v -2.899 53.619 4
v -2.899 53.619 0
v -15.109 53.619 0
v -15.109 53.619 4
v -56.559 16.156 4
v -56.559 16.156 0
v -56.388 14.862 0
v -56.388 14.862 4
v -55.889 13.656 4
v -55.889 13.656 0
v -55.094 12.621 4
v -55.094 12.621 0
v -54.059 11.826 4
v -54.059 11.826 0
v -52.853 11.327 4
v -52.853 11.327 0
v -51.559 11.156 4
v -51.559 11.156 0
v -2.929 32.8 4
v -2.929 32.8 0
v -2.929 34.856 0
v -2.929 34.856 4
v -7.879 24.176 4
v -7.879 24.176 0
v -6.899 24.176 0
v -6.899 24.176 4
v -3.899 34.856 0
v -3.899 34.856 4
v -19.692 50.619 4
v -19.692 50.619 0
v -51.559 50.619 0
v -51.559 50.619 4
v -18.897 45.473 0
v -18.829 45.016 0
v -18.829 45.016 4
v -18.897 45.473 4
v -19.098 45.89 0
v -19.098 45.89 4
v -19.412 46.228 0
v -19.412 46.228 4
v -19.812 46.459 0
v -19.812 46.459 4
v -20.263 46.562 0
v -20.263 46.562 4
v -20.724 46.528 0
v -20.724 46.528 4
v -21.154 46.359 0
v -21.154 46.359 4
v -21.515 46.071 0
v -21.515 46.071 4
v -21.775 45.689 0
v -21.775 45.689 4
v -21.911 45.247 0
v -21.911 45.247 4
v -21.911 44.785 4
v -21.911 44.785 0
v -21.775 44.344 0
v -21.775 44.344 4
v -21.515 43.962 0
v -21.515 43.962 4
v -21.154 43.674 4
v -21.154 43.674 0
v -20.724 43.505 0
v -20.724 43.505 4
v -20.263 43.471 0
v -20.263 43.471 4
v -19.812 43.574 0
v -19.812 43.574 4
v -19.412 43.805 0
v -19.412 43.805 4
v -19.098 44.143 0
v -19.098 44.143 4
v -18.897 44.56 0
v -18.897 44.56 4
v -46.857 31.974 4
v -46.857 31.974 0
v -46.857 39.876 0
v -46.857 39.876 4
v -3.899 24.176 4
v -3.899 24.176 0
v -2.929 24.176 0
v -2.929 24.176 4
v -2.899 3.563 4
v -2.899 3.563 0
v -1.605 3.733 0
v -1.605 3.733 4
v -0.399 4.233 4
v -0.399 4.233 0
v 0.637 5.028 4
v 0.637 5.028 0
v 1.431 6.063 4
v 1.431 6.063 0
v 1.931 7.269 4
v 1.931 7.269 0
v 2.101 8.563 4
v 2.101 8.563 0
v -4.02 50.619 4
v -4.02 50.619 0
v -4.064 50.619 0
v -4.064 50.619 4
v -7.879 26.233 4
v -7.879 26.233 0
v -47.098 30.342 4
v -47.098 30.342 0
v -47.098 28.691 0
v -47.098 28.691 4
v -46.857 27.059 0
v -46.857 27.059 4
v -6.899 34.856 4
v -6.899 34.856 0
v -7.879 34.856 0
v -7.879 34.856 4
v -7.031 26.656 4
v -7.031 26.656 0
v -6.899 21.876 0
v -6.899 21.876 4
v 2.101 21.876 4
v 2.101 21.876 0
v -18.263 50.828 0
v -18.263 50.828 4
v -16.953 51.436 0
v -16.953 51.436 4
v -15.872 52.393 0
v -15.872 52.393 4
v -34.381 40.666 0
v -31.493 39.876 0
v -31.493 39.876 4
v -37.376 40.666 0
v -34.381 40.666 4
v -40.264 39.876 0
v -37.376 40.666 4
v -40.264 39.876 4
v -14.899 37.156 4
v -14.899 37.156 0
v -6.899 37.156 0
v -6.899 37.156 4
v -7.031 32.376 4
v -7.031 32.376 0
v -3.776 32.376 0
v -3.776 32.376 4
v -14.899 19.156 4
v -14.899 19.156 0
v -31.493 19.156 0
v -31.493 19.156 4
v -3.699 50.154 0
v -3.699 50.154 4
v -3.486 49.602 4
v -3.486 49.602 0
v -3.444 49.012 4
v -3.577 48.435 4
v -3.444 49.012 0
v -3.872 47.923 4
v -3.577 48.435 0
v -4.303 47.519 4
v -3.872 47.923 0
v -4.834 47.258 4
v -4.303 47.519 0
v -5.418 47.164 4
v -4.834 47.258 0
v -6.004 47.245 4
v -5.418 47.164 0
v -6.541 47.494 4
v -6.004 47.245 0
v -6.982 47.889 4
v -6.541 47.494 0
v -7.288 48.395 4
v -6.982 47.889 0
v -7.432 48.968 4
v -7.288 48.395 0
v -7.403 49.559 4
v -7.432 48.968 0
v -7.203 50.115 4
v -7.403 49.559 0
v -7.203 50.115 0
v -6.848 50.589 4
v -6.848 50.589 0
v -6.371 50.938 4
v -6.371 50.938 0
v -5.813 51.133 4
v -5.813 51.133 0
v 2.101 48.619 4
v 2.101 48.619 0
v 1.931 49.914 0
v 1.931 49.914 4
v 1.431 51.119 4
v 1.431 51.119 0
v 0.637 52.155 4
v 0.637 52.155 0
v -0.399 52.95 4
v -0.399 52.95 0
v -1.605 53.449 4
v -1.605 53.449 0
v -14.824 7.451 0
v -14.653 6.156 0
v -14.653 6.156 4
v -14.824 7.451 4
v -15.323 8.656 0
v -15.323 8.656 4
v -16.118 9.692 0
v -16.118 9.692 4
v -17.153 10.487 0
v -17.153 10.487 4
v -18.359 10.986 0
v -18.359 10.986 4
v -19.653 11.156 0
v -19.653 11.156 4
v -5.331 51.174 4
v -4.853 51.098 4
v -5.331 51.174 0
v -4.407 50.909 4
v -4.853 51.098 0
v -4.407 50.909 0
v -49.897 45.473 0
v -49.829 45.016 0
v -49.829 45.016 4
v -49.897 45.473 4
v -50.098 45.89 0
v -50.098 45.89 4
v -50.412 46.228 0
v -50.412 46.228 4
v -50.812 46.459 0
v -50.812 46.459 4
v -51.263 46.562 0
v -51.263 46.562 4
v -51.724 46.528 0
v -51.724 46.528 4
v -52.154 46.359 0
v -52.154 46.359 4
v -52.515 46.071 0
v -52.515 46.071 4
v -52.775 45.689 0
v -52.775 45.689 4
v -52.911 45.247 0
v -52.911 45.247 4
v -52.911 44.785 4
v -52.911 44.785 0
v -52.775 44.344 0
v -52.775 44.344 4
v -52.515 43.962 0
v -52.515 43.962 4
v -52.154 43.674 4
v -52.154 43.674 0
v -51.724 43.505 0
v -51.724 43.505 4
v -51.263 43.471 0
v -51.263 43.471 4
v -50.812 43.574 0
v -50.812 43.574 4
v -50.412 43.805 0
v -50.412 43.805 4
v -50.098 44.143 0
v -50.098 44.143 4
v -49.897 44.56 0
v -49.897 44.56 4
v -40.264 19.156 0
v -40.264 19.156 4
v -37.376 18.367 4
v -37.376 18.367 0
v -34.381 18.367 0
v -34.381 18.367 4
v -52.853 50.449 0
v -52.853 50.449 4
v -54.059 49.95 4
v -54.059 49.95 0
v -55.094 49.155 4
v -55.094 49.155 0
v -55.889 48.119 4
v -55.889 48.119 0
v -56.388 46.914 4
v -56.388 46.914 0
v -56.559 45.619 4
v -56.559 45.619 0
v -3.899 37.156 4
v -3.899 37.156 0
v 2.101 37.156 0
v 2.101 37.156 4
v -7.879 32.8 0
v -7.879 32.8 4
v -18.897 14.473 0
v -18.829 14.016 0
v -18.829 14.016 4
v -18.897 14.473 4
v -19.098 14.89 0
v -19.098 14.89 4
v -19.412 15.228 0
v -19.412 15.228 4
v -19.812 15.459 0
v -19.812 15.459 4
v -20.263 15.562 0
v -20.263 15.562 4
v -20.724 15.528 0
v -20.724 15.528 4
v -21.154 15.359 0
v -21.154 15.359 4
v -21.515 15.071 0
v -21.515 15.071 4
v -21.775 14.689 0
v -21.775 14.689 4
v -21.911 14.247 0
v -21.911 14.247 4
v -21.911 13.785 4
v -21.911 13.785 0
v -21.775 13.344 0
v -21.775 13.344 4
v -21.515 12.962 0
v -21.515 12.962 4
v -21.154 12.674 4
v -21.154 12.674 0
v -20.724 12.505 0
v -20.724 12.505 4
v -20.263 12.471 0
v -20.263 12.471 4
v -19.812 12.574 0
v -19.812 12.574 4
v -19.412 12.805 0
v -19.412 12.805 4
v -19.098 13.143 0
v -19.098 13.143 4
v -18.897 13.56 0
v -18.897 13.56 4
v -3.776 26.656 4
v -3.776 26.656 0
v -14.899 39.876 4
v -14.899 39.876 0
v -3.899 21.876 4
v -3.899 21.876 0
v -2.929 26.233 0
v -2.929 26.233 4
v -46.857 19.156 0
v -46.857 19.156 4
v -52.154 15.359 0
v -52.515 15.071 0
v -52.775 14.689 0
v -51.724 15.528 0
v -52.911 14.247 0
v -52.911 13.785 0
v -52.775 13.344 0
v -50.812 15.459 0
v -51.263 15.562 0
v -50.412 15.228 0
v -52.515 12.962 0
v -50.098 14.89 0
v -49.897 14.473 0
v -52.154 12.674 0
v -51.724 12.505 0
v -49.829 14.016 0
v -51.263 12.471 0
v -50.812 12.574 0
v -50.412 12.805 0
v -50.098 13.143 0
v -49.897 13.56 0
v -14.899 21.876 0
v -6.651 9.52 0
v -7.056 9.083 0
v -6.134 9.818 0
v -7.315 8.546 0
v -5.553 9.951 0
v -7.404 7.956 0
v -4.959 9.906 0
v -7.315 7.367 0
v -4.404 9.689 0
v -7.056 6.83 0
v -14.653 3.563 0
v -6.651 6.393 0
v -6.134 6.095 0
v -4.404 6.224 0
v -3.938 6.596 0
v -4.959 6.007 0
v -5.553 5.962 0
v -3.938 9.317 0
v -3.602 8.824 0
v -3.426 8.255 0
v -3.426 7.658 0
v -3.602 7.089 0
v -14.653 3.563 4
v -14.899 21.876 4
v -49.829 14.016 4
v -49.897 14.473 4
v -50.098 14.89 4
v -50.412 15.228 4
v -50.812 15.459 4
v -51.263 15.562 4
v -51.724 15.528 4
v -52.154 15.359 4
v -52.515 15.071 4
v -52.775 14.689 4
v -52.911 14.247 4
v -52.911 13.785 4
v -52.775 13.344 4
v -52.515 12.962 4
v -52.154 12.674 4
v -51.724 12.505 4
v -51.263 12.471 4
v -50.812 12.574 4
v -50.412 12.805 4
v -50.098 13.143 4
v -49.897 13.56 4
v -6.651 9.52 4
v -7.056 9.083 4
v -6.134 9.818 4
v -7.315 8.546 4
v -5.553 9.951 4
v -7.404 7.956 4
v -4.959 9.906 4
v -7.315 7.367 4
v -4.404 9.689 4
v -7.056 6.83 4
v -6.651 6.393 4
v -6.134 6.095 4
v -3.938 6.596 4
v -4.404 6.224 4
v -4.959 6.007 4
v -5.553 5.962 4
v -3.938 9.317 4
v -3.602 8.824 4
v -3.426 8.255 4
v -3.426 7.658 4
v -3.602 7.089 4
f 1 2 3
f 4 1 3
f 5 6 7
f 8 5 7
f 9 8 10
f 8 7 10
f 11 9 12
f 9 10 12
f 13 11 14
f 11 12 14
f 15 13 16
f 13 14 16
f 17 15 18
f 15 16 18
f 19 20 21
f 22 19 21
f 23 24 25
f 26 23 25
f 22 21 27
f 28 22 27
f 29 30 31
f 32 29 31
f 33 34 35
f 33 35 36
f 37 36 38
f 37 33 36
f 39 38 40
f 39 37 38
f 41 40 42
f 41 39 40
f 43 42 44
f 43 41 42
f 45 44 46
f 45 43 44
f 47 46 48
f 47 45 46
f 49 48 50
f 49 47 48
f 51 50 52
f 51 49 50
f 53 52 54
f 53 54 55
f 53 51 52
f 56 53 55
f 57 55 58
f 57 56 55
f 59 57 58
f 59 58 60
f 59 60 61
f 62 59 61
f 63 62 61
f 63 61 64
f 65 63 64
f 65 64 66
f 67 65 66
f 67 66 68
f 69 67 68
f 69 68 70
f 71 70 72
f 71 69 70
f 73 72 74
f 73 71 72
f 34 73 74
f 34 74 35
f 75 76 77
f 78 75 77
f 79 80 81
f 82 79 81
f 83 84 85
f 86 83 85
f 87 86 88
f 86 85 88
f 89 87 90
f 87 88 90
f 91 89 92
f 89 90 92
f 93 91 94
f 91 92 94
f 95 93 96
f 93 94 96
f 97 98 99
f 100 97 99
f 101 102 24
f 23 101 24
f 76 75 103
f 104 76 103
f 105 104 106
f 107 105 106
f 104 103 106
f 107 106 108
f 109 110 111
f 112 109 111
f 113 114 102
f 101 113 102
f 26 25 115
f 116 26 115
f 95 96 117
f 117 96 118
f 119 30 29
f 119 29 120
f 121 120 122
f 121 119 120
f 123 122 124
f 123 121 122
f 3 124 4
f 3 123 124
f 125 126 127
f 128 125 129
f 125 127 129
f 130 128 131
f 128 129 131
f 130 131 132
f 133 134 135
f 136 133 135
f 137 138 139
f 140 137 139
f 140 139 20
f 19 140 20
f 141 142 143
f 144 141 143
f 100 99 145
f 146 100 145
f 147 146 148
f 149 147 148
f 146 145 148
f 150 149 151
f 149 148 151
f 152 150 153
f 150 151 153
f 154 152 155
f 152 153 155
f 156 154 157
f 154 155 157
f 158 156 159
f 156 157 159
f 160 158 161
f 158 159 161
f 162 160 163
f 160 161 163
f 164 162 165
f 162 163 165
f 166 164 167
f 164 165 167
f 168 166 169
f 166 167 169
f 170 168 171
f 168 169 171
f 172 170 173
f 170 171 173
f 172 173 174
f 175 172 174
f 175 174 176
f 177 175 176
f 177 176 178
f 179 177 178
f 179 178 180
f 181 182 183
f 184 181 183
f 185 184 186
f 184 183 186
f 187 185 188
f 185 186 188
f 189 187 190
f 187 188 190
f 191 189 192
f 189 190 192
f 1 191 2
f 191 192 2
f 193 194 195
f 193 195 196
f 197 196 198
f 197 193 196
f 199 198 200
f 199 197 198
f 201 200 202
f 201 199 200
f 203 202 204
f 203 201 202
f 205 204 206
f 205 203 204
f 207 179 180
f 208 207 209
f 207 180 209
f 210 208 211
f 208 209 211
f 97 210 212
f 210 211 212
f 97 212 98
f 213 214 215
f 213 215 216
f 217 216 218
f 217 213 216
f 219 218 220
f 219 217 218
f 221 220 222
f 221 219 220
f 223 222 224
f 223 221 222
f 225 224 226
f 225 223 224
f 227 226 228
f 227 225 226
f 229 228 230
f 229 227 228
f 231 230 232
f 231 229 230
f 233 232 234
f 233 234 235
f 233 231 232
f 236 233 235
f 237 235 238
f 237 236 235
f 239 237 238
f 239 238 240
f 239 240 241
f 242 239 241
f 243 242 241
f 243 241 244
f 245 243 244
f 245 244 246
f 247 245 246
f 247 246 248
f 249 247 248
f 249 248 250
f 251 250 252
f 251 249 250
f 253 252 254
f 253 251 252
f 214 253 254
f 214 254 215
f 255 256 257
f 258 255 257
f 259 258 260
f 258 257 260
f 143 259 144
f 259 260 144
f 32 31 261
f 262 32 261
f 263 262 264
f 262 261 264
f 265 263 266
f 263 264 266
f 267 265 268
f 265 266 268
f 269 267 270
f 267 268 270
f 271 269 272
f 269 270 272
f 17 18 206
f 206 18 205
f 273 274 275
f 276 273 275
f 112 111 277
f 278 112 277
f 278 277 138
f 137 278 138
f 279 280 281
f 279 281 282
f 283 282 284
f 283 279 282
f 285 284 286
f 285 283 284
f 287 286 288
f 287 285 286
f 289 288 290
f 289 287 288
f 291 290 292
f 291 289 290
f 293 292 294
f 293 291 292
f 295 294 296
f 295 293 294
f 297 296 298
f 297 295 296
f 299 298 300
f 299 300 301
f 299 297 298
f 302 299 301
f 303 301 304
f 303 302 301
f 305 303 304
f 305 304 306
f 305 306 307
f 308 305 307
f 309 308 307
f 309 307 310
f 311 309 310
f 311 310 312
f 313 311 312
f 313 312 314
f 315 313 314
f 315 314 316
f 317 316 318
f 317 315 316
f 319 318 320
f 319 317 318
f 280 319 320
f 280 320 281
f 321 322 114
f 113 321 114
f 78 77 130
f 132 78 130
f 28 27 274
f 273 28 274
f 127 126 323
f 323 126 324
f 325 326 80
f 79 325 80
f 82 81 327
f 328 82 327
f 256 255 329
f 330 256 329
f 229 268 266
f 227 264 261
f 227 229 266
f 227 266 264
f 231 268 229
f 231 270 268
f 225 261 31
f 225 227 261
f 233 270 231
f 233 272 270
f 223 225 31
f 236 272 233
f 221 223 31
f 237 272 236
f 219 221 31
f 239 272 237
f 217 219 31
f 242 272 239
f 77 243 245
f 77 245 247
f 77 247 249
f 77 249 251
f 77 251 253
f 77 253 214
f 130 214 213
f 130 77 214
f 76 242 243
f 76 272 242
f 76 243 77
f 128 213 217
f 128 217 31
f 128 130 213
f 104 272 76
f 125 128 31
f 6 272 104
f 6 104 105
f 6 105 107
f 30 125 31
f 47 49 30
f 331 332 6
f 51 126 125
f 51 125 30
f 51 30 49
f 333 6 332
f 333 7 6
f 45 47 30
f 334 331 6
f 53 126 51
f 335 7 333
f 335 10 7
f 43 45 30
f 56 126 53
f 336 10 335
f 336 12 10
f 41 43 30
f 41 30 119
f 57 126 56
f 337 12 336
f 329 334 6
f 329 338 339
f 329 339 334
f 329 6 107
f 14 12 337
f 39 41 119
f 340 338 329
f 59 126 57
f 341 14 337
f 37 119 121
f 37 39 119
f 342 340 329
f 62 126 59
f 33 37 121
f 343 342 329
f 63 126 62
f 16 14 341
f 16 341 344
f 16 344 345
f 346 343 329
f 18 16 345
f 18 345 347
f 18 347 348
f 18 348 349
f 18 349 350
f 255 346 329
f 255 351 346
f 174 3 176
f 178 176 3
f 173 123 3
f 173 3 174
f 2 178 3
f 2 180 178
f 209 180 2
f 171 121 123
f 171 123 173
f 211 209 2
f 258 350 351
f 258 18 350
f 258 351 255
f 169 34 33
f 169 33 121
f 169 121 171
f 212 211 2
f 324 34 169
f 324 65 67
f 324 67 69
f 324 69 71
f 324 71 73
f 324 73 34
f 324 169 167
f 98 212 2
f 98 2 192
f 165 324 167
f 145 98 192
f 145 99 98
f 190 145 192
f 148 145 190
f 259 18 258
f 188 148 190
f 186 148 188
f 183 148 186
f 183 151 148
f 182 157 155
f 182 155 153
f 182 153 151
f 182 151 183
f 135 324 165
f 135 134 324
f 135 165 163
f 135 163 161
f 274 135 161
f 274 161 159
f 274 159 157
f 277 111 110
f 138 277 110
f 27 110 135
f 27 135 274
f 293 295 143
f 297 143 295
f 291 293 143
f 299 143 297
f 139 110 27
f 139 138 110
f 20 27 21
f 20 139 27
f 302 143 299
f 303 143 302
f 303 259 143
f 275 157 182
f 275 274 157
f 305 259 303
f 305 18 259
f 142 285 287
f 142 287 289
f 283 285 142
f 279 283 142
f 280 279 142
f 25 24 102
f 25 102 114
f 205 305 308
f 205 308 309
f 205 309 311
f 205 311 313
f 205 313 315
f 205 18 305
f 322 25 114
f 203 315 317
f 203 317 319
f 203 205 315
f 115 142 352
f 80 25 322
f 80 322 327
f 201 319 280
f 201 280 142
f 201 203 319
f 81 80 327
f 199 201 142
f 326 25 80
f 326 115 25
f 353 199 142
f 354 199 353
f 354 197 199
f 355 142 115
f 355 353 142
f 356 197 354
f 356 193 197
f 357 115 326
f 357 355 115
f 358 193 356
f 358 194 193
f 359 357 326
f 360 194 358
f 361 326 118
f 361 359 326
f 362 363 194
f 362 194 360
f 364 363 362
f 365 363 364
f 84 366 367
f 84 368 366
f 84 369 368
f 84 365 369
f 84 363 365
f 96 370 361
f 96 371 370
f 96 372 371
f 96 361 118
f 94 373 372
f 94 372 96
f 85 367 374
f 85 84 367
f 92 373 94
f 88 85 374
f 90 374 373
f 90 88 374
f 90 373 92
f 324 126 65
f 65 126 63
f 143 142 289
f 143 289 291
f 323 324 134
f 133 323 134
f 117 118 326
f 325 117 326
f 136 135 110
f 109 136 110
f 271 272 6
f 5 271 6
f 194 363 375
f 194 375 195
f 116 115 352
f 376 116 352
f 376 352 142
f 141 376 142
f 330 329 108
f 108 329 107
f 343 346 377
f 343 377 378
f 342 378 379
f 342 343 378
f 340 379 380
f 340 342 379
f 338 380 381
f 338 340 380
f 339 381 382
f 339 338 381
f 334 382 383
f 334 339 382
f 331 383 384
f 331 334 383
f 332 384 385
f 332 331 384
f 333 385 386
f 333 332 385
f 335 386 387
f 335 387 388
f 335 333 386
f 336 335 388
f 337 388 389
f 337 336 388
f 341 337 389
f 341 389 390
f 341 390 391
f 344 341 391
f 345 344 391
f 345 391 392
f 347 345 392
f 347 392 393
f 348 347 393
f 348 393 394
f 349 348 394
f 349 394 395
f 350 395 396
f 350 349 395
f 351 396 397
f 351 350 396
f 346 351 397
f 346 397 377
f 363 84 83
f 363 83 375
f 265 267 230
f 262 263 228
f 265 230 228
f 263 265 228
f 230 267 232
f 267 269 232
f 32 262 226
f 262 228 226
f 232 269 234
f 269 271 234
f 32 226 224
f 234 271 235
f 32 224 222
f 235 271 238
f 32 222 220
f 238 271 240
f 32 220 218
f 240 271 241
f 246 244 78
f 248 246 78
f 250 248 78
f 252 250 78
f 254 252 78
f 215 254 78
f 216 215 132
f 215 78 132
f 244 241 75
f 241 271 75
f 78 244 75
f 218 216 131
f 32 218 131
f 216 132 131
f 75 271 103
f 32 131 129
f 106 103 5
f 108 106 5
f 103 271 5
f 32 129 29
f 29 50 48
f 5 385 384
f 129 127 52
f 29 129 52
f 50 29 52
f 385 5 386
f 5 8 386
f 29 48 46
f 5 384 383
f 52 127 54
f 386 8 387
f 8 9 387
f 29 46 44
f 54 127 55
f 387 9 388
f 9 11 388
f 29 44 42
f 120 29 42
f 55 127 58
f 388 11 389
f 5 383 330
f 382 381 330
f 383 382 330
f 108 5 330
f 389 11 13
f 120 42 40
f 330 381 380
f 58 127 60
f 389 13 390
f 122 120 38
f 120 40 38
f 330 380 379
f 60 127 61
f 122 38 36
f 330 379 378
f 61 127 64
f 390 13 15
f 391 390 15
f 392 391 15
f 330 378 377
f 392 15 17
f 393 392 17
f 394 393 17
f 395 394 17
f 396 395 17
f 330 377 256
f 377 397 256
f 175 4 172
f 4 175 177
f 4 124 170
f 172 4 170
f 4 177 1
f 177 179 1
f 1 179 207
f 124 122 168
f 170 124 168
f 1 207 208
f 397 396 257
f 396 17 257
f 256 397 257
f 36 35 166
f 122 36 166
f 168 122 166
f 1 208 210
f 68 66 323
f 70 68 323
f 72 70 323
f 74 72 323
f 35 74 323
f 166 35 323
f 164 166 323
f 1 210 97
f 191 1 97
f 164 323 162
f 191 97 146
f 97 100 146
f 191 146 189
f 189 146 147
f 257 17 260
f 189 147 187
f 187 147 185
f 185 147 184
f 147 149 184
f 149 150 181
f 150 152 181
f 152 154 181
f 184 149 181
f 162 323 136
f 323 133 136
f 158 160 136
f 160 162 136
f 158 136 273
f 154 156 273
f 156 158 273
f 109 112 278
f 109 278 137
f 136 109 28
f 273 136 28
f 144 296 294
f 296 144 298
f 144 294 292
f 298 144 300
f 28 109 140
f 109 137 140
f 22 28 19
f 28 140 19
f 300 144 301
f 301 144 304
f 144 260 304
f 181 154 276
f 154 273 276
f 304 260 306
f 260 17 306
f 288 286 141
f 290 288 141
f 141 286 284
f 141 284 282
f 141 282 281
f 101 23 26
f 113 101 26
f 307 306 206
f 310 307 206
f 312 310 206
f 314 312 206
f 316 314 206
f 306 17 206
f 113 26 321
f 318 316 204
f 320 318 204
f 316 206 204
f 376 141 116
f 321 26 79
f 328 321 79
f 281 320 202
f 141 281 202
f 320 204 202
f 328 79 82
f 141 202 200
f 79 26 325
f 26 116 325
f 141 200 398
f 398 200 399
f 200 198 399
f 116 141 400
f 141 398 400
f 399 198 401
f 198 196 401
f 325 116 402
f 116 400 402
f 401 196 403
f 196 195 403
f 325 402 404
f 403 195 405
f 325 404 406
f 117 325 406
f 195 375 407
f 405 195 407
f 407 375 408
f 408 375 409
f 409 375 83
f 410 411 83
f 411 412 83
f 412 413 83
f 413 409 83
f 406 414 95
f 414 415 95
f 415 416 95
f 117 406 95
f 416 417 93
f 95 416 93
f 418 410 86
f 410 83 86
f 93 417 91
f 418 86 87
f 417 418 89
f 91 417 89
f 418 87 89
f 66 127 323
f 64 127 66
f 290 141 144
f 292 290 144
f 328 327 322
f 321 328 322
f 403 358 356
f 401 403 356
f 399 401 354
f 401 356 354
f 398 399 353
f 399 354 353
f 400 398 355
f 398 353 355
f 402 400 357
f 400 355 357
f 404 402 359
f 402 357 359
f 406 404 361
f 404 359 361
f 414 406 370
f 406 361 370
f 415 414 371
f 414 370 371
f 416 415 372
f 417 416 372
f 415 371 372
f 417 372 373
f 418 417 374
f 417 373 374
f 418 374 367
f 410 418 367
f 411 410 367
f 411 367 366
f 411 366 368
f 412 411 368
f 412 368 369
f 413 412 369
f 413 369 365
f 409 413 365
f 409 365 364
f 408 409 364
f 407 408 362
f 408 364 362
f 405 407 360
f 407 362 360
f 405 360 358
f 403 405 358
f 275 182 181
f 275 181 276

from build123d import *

# Parameters (mm, degrees)
SKETCH1_R           = 1.55
BOSS_EXTRUDE1_DEPTH = 4
SKETCH2_R           = 11.25
CUT_EXTRUDE1_DEPTH  = 10
SKETCH4_R           = 2
SKETCH4_W           = 16.7545444
SKETCH4_H           = 7.593360653
BOSS_EXTRUDE2_DEPTH = 4
SKETCH5_R           = 2.001806379
CUT_EXTRUDE2_DEPTH  = 79.038052705
FILLET1_R           = 5


with BuildPart() as part:
    # Sketch1 → Boss-Extrude1 (new body)
    with BuildSketch(Plane.XY):
        Polygon((-6.898627884, 24.176481231), (-6.898627884, 21.876481231), (-14.898627884, 21.876481231), (-14.898627884, 19.156481231), (-46.856968571, 19.156481231), (-46.856968571, 39.876481231), (-14.898627884, 39.876481231), (-14.898627884, 37.156481231), (-6.898627884, 37.156481231), (-6.898627884, 34.856481231), (-7.878627884, 34.856481231), (-7.878627884, 32.800088029), (-7.031414289, 32.376481231), (-3.77584148, 32.376481231), (-2.928627884, 32.800088029), (-2.928627884, 34.856481231), (-3.898627884, 34.856481231), (-3.898627884, 37.156481231), (2.101372116, 37.156481231), (2.101372116, 47.876481231), (2.101372116, 50.619437371), (-56.558762416, 50.619437371), (-56.558762416, 47.876481231), (-56.558762416, 39.876481231), (-56.558762416, 19.156481231), (-56.558762416, 11.156481231), (2.101372116, 11.156481231), (2.101372116, 21.876481231), (-3.898627884, 21.876481231), (-3.898627884, 24.176481231), (-2.928627884, 24.176481231), (-2.928627884, 26.232874433), (-3.77584148, 26.656481231), (-7.031414289, 26.656481231), (-7.878627884, 26.232874433), (-7.878627884, 24.176481231), align=None)
        with Locations((-51.378627884, 14.016481231)):
            Circle(SKETCH1_R, mode=Mode.SUBTRACT)
        with Locations((-20.378627884, 14.016481231)):
            Circle(SKETCH1_R, mode=Mode.SUBTRACT)
        with Locations((-51.378627884, 45.016481231)):
            Circle(SKETCH1_R, mode=Mode.SUBTRACT)
        with Locations((-20.378627884, 45.016481231)):
            Circle(SKETCH1_R, mode=Mode.SUBTRACT)
    extrude(amount=BOSS_EXTRUDE1_DEPTH)

    # Sketch2 → Cut-Extrude1 (cut)
    with BuildSketch(Plane.XY.offset(4)):
        with Locations((-35.878627884, 29.516481231)):
            Circle(SKETCH2_R)
    extrude(amount=-CUT_EXTRUDE1_DEPTH, mode=Mode.SUBTRACT)

    # Sketch4 → Boss-Extrude2 (add)
    # profile 1 of 2: a face of its own
    with BuildSketch(Plane(origin=(0, 0, 0), x_dir=(-1, 0, 0), z_dir=(0, 0, -1))):
        Polygon((-2.101372116, 50.619437371), (-2.101372116, 53.619437371), (15.109222475, 53.619437371), (15.109222475, 50.619437371), (15.109222475, 46.213030652), (-2.101372116, 46.03430596), align=None)
        with Locations((5.403627884, 49.175308869)):
            Circle(SKETCH4_R, mode=Mode.SUBTRACT)
    # profile 2 of 2: a face of its own
    with BuildSketch(Plane(origin=(0, 0, 0), x_dir=(-1, 0, 0), z_dir=(0, 0, -1))):
        with Locations((6.275900084, 7.359800905)):
            Rectangle(SKETCH4_W, SKETCH4_H)
        with Locations((5.403627884, 7.956481231)):
            Circle(SKETCH4_R, mode=Mode.SUBTRACT)
    extrude(amount=-BOSS_EXTRUDE2_DEPTH)

    # Sketch5 → Cut-Extrude2 (cut, through all)
    with BuildSketch(Plane(origin=(0, 0, 0), x_dir=(-1, 0, 0), z_dir=(0, 0, -1))):
        with Locations((5.440315917, 49.166162951)):
            Circle(SKETCH5_R)
    extrude(amount=-CUT_EXTRUDE2_DEPTH, mode=Mode.SUBTRACT)

    # Fillet1
    # the kernel refuses this fillet: 5 mm, written as the material it adds along each edge
    with BuildSketch(Plane(origin=(-14.653172284, 11.156481231, 0), x_dir=(0, -1, 0), z_dir=(0, 0, 1))) as fillet1_piece_1:
        with BuildLine():
            CenterArc((FILLET1_R, -FILLET1_R), FILLET1_R, 90, 90)
            Line((0, -FILLET1_R), (0, 0))
            Line((0, 0), (FILLET1_R, 0))
        make_face()
    extrude(amount=4)
    with BuildSketch(Plane(origin=(-15.109222475, 50.619437371, 0), x_dir=(-1, 0, 0), z_dir=(0, 0, 1))) as fillet1_piece_2:
        with BuildLine():
            CenterArc((4.582575695, -5), FILLET1_R, 90, 66.421821522)
            Line((0, -3), (0, 0))
            Line((0, 0), (4.582575695, 0))
        make_face()
    extrude(amount=4)
    # the kernel refuses this fillet: 5 mm, written as the material it takes off along each edge
    with BuildSketch(Plane(origin=(2.101372116, 53.619437371, -12.5), x_dir=(0, -1, 0), z_dir=(0, 0, 1)), Plane(origin=(2.101372116, 3.563120578, -12.5), x_dir=(-1, 0, 0), z_dir=(0, 0, 1)), Plane(origin=(-56.558762416, 11.156481231, -12.5), x_dir=(0, 1, 0), z_dir=(0, 0, 1)), Plane(origin=(-56.558762416, 50.619437371, -12.5), x_dir=(1, 0, 0), z_dir=(0, 0, 1))) as fillet1_2_piece_1:
        with BuildLine():
            CenterArc((FILLET1_R, -FILLET1_R), FILLET1_R, 90, 90)
            Line((0, -FILLET1_R), (0, 0))
            Line((0, 0), (FILLET1_R, 0))
        make_face()
    extrude(amount=29, mode=Mode.SUBTRACT)


solid = part.part
